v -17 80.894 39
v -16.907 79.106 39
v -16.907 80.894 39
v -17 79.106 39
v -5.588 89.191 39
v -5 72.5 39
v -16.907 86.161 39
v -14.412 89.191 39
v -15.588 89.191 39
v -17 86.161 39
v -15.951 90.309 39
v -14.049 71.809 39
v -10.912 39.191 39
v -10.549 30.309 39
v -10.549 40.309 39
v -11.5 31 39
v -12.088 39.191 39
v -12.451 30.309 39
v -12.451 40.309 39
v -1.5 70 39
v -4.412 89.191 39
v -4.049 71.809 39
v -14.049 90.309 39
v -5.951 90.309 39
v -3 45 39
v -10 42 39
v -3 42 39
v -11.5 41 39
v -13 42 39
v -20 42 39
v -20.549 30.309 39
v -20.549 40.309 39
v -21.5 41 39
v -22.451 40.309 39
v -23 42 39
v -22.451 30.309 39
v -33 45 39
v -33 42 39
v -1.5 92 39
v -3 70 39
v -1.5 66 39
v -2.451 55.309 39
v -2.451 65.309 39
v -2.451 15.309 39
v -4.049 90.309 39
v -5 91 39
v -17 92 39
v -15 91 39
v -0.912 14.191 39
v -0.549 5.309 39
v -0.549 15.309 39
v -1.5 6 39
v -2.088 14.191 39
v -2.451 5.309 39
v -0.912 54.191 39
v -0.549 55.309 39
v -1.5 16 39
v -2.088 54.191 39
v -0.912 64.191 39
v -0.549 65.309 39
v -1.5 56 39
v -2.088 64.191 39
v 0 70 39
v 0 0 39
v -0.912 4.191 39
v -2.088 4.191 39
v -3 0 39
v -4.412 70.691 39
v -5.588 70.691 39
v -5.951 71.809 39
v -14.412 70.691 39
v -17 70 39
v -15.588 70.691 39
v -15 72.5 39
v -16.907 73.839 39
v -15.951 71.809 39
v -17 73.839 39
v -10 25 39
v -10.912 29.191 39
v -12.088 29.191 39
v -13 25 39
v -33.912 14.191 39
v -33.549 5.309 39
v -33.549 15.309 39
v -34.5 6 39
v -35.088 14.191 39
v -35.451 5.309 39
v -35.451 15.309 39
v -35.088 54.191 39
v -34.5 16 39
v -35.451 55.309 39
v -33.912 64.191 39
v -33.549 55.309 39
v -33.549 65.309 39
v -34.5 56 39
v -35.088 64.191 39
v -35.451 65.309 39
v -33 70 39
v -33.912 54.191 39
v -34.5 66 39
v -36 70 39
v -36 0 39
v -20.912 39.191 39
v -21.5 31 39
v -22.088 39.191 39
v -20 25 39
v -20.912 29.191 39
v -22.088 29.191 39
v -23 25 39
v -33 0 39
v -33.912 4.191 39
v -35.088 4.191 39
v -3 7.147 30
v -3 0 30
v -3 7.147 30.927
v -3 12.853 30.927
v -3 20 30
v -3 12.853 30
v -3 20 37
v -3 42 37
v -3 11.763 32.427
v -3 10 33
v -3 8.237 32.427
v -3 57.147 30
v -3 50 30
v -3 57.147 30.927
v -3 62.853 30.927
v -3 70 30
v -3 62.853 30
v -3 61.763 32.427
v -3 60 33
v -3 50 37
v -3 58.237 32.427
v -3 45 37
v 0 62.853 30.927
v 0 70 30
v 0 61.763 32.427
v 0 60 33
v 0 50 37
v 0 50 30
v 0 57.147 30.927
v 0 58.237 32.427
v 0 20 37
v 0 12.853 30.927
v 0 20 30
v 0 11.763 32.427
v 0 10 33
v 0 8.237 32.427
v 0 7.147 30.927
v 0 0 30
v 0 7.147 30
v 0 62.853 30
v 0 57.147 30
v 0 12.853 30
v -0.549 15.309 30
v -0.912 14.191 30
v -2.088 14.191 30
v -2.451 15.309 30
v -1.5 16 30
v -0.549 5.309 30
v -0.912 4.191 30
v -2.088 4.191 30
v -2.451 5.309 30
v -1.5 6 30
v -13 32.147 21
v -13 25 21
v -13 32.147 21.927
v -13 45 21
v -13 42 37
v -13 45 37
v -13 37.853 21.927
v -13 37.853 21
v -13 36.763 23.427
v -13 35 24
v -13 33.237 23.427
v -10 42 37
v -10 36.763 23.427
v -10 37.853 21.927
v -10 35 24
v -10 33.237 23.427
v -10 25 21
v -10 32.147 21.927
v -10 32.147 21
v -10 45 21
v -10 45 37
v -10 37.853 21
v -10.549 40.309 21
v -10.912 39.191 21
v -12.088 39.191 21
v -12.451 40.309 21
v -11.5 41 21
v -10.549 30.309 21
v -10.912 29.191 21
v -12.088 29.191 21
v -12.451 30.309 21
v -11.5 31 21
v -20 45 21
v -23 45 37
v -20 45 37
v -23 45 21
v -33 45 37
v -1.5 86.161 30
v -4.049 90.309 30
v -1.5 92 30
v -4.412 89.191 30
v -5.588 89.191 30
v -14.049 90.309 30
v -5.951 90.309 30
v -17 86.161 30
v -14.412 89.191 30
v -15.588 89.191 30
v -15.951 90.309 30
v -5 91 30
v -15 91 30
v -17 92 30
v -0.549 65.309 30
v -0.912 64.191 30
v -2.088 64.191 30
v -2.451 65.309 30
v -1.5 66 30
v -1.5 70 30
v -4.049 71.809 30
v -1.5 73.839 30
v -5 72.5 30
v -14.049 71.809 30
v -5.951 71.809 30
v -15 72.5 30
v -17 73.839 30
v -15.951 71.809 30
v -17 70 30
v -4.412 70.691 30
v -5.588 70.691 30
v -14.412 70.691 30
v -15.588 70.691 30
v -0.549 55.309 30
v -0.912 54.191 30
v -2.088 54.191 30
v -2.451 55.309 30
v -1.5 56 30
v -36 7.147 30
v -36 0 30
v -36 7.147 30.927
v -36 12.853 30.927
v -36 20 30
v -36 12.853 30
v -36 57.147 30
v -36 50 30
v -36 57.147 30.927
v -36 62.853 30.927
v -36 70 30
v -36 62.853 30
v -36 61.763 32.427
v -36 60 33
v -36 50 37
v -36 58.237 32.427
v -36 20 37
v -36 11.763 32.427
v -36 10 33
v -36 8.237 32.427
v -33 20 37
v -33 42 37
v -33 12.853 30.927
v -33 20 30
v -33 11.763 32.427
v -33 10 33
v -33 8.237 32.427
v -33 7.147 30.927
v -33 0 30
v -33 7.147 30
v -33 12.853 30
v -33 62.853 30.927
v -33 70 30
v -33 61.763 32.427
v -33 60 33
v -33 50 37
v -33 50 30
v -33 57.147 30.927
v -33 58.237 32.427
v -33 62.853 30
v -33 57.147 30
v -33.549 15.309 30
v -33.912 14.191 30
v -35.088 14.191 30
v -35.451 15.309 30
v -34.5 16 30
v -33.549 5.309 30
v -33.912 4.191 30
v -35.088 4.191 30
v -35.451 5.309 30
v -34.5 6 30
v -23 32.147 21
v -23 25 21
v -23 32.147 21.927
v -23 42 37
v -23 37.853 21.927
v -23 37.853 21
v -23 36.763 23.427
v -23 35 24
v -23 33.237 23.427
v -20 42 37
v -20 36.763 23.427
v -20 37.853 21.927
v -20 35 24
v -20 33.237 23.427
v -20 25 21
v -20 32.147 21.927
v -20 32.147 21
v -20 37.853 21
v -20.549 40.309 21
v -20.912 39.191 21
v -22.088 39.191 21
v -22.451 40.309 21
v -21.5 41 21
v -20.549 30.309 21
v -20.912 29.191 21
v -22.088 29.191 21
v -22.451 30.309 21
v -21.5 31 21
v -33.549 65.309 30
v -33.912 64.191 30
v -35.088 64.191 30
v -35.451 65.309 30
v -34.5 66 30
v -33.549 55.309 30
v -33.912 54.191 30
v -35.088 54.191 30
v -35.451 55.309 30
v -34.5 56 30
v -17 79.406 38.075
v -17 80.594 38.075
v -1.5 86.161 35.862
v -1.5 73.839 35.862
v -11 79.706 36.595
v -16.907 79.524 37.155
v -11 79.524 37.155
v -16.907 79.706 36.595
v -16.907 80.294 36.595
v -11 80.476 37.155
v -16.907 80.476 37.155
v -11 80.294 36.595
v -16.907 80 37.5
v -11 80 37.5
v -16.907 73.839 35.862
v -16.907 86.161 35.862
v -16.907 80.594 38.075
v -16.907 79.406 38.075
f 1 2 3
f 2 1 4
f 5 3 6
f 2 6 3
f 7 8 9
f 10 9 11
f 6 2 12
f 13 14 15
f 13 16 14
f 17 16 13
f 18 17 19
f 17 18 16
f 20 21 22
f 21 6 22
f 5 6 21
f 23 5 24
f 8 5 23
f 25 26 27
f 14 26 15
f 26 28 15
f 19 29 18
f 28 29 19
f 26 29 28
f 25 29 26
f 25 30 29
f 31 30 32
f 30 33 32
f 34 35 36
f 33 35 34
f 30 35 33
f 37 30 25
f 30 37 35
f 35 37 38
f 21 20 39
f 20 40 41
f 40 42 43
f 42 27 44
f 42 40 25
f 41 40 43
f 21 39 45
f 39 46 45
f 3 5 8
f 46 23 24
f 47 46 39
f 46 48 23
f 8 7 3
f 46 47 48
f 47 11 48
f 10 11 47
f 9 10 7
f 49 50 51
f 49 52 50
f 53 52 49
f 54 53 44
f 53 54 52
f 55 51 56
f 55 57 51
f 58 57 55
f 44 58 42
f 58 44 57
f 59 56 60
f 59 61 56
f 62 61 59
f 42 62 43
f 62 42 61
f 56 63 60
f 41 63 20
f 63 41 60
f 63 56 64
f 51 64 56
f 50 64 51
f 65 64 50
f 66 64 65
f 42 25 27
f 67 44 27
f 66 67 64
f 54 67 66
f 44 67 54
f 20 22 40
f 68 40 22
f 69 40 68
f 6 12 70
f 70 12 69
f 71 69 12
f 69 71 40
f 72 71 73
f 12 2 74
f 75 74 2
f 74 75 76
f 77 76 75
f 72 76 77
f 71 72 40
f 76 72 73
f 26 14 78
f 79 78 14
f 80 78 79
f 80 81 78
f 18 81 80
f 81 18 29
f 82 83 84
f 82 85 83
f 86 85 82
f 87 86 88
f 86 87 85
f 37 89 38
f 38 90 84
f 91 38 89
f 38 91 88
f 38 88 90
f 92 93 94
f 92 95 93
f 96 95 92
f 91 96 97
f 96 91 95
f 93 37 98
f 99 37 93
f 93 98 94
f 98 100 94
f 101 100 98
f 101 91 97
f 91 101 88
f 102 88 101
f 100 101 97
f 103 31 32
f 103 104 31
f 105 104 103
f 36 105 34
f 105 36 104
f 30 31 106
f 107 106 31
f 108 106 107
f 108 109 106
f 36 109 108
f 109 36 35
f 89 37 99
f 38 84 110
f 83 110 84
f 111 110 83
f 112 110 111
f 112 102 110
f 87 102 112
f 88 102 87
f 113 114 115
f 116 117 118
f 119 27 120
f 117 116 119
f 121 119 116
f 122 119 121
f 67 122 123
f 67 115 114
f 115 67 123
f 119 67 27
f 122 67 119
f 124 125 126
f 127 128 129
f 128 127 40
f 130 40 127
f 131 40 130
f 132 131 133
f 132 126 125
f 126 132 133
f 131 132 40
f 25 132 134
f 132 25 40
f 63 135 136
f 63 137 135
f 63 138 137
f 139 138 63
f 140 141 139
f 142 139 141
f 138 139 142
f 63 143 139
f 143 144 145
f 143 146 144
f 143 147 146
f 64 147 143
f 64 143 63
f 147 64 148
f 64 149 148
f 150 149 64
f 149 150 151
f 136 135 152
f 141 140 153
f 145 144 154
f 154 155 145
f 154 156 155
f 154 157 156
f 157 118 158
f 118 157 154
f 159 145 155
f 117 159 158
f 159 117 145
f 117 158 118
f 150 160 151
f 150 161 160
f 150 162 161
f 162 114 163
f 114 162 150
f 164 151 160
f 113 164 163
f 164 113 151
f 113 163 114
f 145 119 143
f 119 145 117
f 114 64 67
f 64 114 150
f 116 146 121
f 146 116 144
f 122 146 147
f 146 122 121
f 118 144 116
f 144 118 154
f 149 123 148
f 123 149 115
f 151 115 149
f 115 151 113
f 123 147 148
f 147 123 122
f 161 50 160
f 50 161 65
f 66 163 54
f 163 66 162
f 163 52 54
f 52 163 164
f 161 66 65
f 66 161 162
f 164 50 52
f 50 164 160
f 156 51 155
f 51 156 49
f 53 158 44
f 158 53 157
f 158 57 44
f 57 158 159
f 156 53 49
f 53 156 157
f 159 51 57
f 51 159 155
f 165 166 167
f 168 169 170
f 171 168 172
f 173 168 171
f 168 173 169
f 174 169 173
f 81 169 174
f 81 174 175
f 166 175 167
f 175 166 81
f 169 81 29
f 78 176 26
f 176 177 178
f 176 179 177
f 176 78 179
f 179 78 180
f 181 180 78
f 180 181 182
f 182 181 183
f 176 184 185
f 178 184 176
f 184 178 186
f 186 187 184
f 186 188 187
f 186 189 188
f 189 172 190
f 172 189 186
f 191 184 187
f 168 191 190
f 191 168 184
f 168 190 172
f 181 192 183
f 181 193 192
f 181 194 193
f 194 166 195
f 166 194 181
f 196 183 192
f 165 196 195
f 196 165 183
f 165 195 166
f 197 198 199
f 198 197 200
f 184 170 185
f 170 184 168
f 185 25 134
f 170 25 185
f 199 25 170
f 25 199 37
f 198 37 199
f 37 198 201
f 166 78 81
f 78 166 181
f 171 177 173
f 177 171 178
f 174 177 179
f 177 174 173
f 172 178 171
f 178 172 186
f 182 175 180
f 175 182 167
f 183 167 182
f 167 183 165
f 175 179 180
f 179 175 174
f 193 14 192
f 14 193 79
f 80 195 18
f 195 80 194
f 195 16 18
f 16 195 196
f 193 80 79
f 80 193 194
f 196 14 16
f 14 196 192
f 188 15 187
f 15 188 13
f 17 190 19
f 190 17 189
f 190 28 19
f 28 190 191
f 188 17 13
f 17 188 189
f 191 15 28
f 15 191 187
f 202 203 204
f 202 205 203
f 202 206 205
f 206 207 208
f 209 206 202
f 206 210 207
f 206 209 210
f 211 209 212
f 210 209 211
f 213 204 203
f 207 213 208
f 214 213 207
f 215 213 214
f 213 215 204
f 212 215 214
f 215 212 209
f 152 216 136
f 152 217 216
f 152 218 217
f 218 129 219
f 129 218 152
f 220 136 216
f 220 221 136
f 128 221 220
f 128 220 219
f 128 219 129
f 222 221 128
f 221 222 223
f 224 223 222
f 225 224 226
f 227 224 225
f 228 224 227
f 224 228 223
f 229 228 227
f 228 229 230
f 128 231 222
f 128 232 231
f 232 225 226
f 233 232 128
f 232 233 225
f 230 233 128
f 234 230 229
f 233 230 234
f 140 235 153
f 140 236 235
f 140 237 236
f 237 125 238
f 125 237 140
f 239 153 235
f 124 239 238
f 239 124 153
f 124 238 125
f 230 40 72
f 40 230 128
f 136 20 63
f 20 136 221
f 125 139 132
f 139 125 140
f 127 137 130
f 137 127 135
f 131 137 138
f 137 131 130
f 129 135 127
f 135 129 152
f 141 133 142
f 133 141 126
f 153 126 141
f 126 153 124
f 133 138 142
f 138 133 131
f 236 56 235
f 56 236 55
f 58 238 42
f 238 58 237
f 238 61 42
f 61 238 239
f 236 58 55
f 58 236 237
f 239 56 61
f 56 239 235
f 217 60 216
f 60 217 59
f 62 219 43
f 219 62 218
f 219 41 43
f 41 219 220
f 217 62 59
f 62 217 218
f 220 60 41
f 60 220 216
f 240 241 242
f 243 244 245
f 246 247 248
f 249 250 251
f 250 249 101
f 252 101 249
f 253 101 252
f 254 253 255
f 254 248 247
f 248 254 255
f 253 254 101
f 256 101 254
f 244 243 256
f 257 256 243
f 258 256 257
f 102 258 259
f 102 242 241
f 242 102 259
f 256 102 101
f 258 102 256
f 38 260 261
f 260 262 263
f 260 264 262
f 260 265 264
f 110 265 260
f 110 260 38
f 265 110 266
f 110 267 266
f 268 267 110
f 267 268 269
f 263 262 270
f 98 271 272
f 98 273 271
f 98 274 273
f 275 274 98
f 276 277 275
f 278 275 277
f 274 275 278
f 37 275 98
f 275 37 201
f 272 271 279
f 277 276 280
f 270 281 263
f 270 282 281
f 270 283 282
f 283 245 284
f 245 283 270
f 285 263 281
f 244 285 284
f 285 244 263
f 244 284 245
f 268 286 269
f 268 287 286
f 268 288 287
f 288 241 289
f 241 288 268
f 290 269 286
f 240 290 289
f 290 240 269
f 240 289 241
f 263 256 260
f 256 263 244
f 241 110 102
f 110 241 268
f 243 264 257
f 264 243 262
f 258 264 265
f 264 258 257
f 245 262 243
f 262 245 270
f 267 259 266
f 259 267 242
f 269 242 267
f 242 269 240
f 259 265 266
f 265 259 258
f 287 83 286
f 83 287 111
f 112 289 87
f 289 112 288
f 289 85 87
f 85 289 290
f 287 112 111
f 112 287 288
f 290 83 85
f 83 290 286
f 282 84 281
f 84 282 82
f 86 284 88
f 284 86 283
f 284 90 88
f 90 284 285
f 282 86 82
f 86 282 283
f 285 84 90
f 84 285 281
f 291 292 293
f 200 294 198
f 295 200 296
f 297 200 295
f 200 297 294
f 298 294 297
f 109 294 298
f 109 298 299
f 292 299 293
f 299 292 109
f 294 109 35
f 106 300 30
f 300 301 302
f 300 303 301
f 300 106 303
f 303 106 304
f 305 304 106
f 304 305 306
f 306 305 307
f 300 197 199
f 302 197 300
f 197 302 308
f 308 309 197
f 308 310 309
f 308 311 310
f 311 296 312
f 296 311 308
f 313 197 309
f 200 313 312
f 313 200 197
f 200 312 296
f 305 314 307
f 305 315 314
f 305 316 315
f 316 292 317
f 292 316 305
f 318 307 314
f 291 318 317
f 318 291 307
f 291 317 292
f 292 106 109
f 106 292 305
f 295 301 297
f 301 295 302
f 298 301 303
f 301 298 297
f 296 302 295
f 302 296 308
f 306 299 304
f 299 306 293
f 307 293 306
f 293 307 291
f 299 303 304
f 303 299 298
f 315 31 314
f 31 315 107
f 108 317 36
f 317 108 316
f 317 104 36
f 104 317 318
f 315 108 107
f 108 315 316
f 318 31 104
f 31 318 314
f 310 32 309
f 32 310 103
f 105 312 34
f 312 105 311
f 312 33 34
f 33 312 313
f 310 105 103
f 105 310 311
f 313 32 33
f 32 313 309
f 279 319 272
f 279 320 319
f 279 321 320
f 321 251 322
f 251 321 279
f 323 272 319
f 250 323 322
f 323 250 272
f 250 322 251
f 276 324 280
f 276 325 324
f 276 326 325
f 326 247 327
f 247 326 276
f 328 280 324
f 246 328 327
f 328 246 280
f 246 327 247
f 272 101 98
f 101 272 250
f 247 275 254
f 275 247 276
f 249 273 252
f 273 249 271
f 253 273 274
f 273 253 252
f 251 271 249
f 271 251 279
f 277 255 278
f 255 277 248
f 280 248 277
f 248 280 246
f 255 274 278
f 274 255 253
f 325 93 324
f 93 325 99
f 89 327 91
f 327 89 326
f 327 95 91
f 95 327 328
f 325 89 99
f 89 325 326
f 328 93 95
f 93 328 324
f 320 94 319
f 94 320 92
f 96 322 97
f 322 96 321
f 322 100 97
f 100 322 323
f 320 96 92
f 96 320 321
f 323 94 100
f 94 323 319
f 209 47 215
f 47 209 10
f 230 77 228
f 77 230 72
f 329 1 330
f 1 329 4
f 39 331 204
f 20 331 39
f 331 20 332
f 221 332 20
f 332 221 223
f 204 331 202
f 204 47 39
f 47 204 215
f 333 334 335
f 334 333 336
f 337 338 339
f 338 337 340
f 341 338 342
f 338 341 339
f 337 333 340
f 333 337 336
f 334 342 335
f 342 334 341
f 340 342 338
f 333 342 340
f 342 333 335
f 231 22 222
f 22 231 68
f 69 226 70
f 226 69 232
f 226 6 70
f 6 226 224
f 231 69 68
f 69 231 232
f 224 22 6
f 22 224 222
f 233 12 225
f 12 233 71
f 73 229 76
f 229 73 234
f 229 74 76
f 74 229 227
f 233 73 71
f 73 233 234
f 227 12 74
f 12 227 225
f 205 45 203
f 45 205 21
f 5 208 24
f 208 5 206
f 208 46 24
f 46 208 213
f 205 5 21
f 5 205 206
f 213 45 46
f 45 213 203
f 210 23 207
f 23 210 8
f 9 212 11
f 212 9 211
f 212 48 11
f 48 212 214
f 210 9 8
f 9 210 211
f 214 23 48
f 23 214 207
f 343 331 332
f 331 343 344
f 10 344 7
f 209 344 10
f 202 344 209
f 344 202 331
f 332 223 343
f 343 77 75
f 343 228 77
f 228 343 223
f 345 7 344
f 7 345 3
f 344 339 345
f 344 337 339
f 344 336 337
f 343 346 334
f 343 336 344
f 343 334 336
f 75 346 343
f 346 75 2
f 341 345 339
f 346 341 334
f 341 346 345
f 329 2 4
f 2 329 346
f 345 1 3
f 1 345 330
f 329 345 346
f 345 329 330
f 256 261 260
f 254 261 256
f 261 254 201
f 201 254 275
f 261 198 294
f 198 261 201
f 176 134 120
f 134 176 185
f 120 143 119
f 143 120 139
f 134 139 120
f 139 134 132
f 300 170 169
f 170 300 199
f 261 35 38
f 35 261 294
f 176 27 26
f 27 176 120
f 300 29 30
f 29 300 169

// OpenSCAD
// file: ModuleAntrieb.scad
// //////////////////////////////////
// Module für Katzenklappenverschluss
// //////////////////////////////////

include <gears.scad>;

module armHorn (laenge, breite, dicke) {
    difference() {
    union() {
    translate ([0,-breite/2,0])
    cube([laenge,breite,dicke], false);
    translate ([laenge,0,0])
    cylinder(dicke,r=breite/2, false); 
    }
    translate ([laenge*1.0,0,0])
    loch(radius=2,tiefe= dicke + 1);
/*    translate ([laenge*0.6,0,dicke-1])
    letter("Achim");
    translate ([laenge*0.6,0,1])
    rotate([0,180,0])
    letter("Tim");
    translate ([laenge*0.2,0,0])
    loch(radius=2,tiefe= dicke + 1);
*/    }
};

module mittelRad (breite) {
    difference() {
        cylinder(breite,r=12.5, false);
        cylinder(breite,r=2.0, false);
        
/*        translate([0,0,breite])
        gear (
            toothNo = 100, 
            toothWidth = 1, 
            toothHeight  = 2, 
            thickness = breite,
            holeRadius = 5,
            holeSides = 6
        );
        translate ([-25,0,0])
        loch(radius=5,tiefe=breite + 1);
        translate ([25,0,0])
        loch(radius=5,tiefe=breite + 1);
        translate ([0,-25,0])
        loch(radius=5,tiefe=breite + 1);
        translate ([0,25,0])
        loch(radius=5,tiefe=breite + 1);
*/        } 
};

module loch (radius, tiefe) {
        cylinder(tiefe,r=radius, false);   
};

module zapfen (breite,tiefe) {
        cube([breite,breite,tiefe], true);   
};


module lArm(laenge, breite, dicke) {
    difference() {
        union() {
            armHorn(laenge=laenge, breite=breite, dicke=dicke);
            rotate(90) armHorn(laenge=laenge, breite=breite, dicke=dicke);
            cylinder(dicke,r=breite/2, false); 
           }
            translate ([0,0,0])
            zapfen(breite= 3, tiefe = dicke * 2);
        }
};

module mittelAchse(laenge, radius_achse, zapfen_breite, zapfen_laenge, breite) {
    difference() {
        union() {
            translate ([0,0,zapfen_laenge /2])
            zapfen(breite= zapfen_breite, tiefe=zapfen_laenge);   
            translate ([0,0,zapfen_laenge])
            cylinder(laenge,r = radius_achse, false, $fn=6);
            translate ([0,0,laenge+(1.5*zapfen_laenge)])
            zapfen(breite= zapfen_breite, tiefe=zapfen_laenge);   
        }
        cylinder (laenge+6,r=0.9, false);
    }
};

module achse(laenge_achse,laenge_stift, radius_stift, radius_achse) {
    union(){
        cylinder(laenge_achse,r = radius_achse, false, $fn=6);
        translate([0,0,-laenge_stift])
        cylinder(laenge_stift,r = radius_stift, false);
        translate([0,0,laenge_achse])
        cylinder(laenge_stift,r = radius_stift, false);
    }
};

/* Testdruck

stuetzeTop(18);

    mittelAchseRadius       = 4;

difference() {

    gear (number_of_teeth=32,
                circular_pitch=109.8,
                hub_diameter=7,
                bore_diameter=1.8,
                rim_width=2,
                rim_thickness=4,
                gear_thickness=4,
                hub_thickness=4,
                circles=0);

    translate([0,0,-10])
    achse(laenge_achse=28,laenge_stift=4.0, radius_stift=2.75, radius_achse=mittelAchseRadius+0.5);
}

*/

font = "Liberation Sans";


letter_size = 5;
letter_height = 3;


module letter(l) {
  // Use linear_extrude() to make the letters 3D objects as they
  // are only 2D shapes when only using text()
  linear_extrude(height = letter_height) {
    text(l, size = letter_size, font = font, halign = "center", valign = "center", $fn = 16);
  }
}


module sg90() {
	color("blue") difference() {
		union() {
			translate([0,0,22.5/2]) cube([22.5,12.2,22.5], center=true);
			translate([0,0,16.75]) cube([32.2,12.2,2], center=true);

			translate([0,0,22.5-1]) {
				hull() {
					translate([-1,0,0]) cylinder(d=5.5, h=4+1);
					translate([1,0,0]) cylinder(d=5.5, h=4+1);
				}

				translate([5.5,0,0]) cylinder(d=11.6, h=4+1);
			}

		}	

		translate([-32.5/2+2,0,16.75-2]) {
			cylinder(d=2, h=2+2);
			translate([-2,0,2]) cube([4,1,2+2], center=true);
		}
		translate([32.5/2-2,0,16.75-2]) {
			cylinder(d=2, h=2+2);
			translate([2,0,2]) cube([4,1,2+2], center=true);
		}
	}
	color("white") translate([5.5,0,22.5-1+4]) {
		difference() {
			cylinder(d=4.8, h=3+1);
			translate([0,0,1]) cylinder(d=2, h=4);
		}
	}
}

module stuetze (hoehe) {
    difference() {
        translate ([0,0,0])
        cube([hoehe,20,3], false);
        translate ([hoehe,10,0])
        cylinder(21,r=3, center=true);

        translate ([hoehe,5,1.5])
        rotate([90,0,90])
        cylinder(5,r=1, center=true);

        translate ([hoehe,15,1.5])
        rotate([90,0,90])
        cylinder(5,r=1, center=true);
    }
}

module stuetzeTop (hoehe) {
    difference() {
        translate ([0,0,0])
        cube([hoehe,20,3], false);
        translate ([0,10,0])
        cylinder(21,r=3, center=true);
        translate ([hoehe,5,1.5])
        rotate([90,0,90])
        cylinder(55,r=1, center=true);

        translate ([hoehe,15,1.5])
        rotate([90,0,90])
        cylinder(55,r=1, center=true);
    } 


}

module balken (laenge) {
    difference() {
        translate ([0,-10,0])
        cube([5,laenge,3], false);
    }
/*    translate ([2.5,25,2.5])
        rotate([-90,90,0])
        letter("Design by Achim & Tim 2018");    
*/
}

module boden(laenge, breite) {
    difference() {
        Bodendicke = 3;
        cube([Bodendicke,laenge,breite], false);

        // Löcher in Bodenplatte
        rotate([0,90,0])
        translate ([-breite/2,laenge*0.1,0])
        cylinder(Bodendicke+1,r=1.5, center=false);
        rotate([0,90,0])
        translate ([-breite/2,laenge*0.5,0])
        cylinder(Bodendicke+1,r=1.5, center=false);
        rotate([0,90,0])
        translate ([-breite/2,laenge*0.9,0])
        cylinder(Bodendicke+1,r=1.5, center=false);
    }
}

module wand(hoehe, anzahl, abstand) {
    for (a =[0:abstand:anzahl*abstand])
        translate ([0,a,0])
        stuetze(hoehe);
}

module halterung(hoehe) {
    // Bodenplatte
    Bodendicke = 3;
    cube([Bodendicke,22,36],false);
    difference(){
        // Motorhalterung
        translate ([0,0,1.5])
        cube([hoehe,22,15.5],false);
        translate ([8,10,11])
        cylinder(6,r=0.5, center=false);

        translate ([hoehe,1.5,5])
        rotate([90,0,90])
        cylinder(5,r=1, center=true);
        translate ([hoehe,1.5,15])
        rotate([90,0,90])
        cylinder(5,r=1, center=true);
        translate ([hoehe,20,5])
        rotate([90,0,90])
        cylinder(5,r=1, center=true);
        translate ([hoehe,20,15])
        rotate([90,0,90])
        cylinder(5,r=1, center=true);
   }
}

module halterungOben(hoehe) {
    difference(){
        // Motorhalterung
        translate ([0,0,1.5])
        cube([hoehe,22,15.5],false);
        translate ([7.0,10,11])
        cylinder(6,r=0.5, center=false);

        translate ([hoehe,1.5,5])
        rotate([90,0,90])
        cylinder(55,r=1, center=true);
        translate ([hoehe,1.5,15])
        rotate([90,0,90])
        cylinder(55,r=1, center=true);
        translate ([hoehe,20,5])
        rotate([90,0,90])
        cylinder(55,r=1, center=true);
        translate ([hoehe,20,15])
        rotate([90,0,90])
        cylinder(55,r=1, center=true);
   }
}
// main file
include <ModuleAntrieb.scad>;
include <gears.scad>;

zahnradabstand = 25;
gehaeusehoehe = 30;
wandstaerke = 2;
stufe = 9;              // Höhenstufe für Zahnrad 2

module gearBoxUnten() {
    union() {

        // Stützen vorne
        translate ([0,0*zahnradabstand,0])
        stuetze(gehaeusehoehe);
        translate ([0,1*zahnradabstand,10])
        stuetze(gehaeusehoehe-stufe);
        translate ([0,2*zahnradabstand,0])
        stuetze(gehaeusehoehe);
        
        // Boden
        translate ([0,0,3])
        boden(zahnradabstand*2+20,30);
        
        
        // Stützen hinten
        translate ([0,0*zahnradabstand,33])
        stuetze(gehaeusehoehe);
        translate ([0,1*zahnradabstand,20])
        stuetze(gehaeusehoehe-stufe);
        translate ([0,2*zahnradabstand,33])
        stuetze(gehaeusehoehe);
        
        // Motorhalterung
        difference() {
            translate ([0,zahnradabstand*2+20,0])
            halterung(gehaeusehoehe);
            translate ([23,80,1])
            scale(1.01) sg90();
        }
    }
}

module gearBoxOben() {
    hoeheOben = 9;
    union() {

        // Deckel
        translate ([39,20,0])
        rotate([0,0,90])
        cube([30,2,3]);
        translate ([39,20,33])
        rotate([0,0,90])
        cube([30,2,3]);
        translate ([39,42,3])
        rotate([0,0,90])
        cube([3,2,30]);

        // Stützen vorne
        translate ([gehaeusehoehe,0*zahnradabstand,0])
        stuetzeTop(hoeheOben);
        translate ([gehaeusehoehe-stufe,1*zahnradabstand,10])
        stuetzeTop(hoeheOben+stufe);
        translate ([gehaeusehoehe,2*zahnradabstand,0])
        stuetzeTop(hoeheOben);

        // Stützen hinten
        translate ([gehaeusehoehe,0*zahnradabstand,33])
        stuetzeTop(hoeheOben);
        translate ([gehaeusehoehe-stufe,1*zahnradabstand,20])
        stuetzeTop(hoeheOben+stufe);
        translate ([gehaeusehoehe,2*zahnradabstand,33])
        stuetzeTop(hoeheOben);

        // Motorhalterung
        difference() {
            translate ([gehaeusehoehe,zahnradabstand*2+20,0])
            halterungOben(hoeheOben);
            translate ([24.5,80,1])
            scale(1.01) sg90();
        }

    }
}

module zahnraeder() {
     
    difference() {
        // Zahnrad 0
        translate ([28.5,80,28])
        //rotate([0,0,1/84*360])
        gear (number_of_teeth=37,
                    circular_pitch=109.8,
                    hub_diameter=7,
                    bore_diameter=1.8,
                    rim_width=2,
                    rim_thickness=4,
                    gear_thickness=2,
                    hub_thickness=3,
                    circles=0);
        // Servo ausschneiden
        translate ([23,80,0])
        scale(1.01) sg90();
    }
    // Zahnrad 1.1
    translate ([gehaeusehoehe,60,28])
    rotate([0,0,1/30*360])
    gear (number_of_teeth=30,
                circular_pitch=109.8,
                hub_diameter=7,
                bore_diameter=1.8,
                rim_width=2,
                rim_thickness=4,
                gear_thickness=4,
                hub_thickness=4,
                circles=0);

    // Zahnrad 1.2
    translate ([gehaeusehoehe,60,14])
    // rotate([0,0,1/30*360])
    gear (number_of_teeth=30,
                circular_pitch=109.8,
                hub_diameter=7,
                bore_diameter=1.8,
                rim_width=2,
                rim_thickness=4,
                gear_thickness=4,
                hub_thickness=4,
                circles=0);

    translate ([gehaeusehoehe,60,4])
    achse(laenge_achse=28,laenge_stift=4.0, radius_stift=2.75, radius_achse=mittelAchseRadius);


    // Zahnrad 2
    translate ([gehaeusehoehe-stufe,35,14])
    //rotate([0,0,1/108*360])
    gear (number_of_teeth=54,
                circular_pitch=109.8,
                hub_diameter=7,
                bore_diameter=1.8,
                rim_width=2,
                rim_thickness=4,
                gear_thickness=4,
                hub_thickness=4,
                circles=0);

    translate ([gehaeusehoehe-stufe,35,14.0])
    achse(laenge_achse=5,laenge_stift=4.0, radius_stift=2.75, radius_achse=mittelAchseRadius);

    // Zahnrad 3
    translate ([gehaeusehoehe,10,14])
    rotate([0,0,1/56*360])
    gear (number_of_teeth=32,
                circular_pitch=109.8,
                hub_diameter=7,
                bore_diameter=1.8,
                rim_width=2,
                rim_thickness=4,
                gear_thickness=2,
                hub_thickness=5,
                circles=6);


    // Maße eines L-Arms
    lArmBreite  = 10;
    lArmLaenge  = 21;
    lArmDicke   = 3;

    // Maße der Mittelachse
    mittelAchseLaenge       = 21;
    mittelAchseRadius       = 4;
    mittelAchseZapfenBreite = 2.5;
    mittelAchseZapfenLaenge = 3;
    mittelAchseRadBreite    = 5;

    // Verschluss
    translate([gehaeusehoehe,10,4.5])
    rotate([0,0,90])
    union() {

            // Verschlussriegel unten
            lArm(laenge=lArmLaenge,breite=lArmBreite,dicke=lArmDicke);

            translate([0,0,0])
            // Mittelachse
/*            mittelAchse(laenge = mittelAchseLaenge, radius_achse = mittelAchseRadius, zapfen_breite = mittelAchseZapfenBreite, zapfen_laenge = mittelAchseZapfenLaenge, breite = mittelAchseRadBreite);
*/                
    achse(laenge_achse=28,laenge_stift=4.0, radius_stift=2.75, radius_achse=mittelAchseRadius);

            // Verschlussriegel oben
            translate ([0,0,mittelAchseLaenge+lArmDicke])
            rotate(-90) lArm(laenge=lArmLaenge,breite=lArmBreite,dicke=lArmDicke);
    }

// Servo anzeigen
translate ([23,80,1])
scale(1.01) sg90();

}

rotate([0,-90,0])
union () {
//    gearBoxUnten();
    gearBoxOben();
//    zahnraeder();
}
